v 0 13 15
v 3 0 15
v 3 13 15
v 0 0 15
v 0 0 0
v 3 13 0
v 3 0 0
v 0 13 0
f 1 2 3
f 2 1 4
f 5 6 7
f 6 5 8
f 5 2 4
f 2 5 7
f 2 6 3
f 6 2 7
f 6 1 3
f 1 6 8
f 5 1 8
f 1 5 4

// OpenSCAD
// Generated by SolidPython 1.0.1 on 2020-07-29 00:39:26


cube(size = [3, 13, 15]);
/***********************************************
*********      SolidPython code:      **********
************************************************
 
# import packages: SolidPython
from solid import *
from solid.utils import *
from itertools import chain, combinations


class Resize:

    def __init__(self, scad_file):
        self.scad_file = scad_file
        #self.scad_file = import_scad(scad_file)
        # cone/cylinder param:
        self.r1 = 0
        self.r2 = 0
        self.h = 0
        # rectangular prism param:
        self.w = 0
        self.l = 0
        # ellipse param:
        self.r = 0

    # import OpenScad code (file name corresponds to shape)


    # classify shape + parameters
    def assign(self, param1, param2, param3):
        if self.scad_file == 'cone.scad':
            self.r1 = param1
            self.r2 = param2
            self.h = param3
        elif self.scad_file == 'cylinder.scad':
            self.r1 = param1
            self.r2 = param2
            self.h = param3
        elif self.scad_file == 'rectangularPrism.scad':
            self.h = param1
            self.l = param2
            self.w = param3
        else:
            self.r = param1
            self.h = param2

    # resize parameters
    def iterate(self):
        x = range(3, 20, 2)
        i = 1
        if self.scad_file == 'cone.scad':
            tempList = list(combinations(x, 2))
            for temp in tempList:
                param1 = temp[0]
                param2 = temp[1]
                filepath = 'produced_scad_files/' + 'cone' + str(param1) + '_' + str(param2) + '_' + '.scad'
                scad_render_to_file(cylinder(h=param1, r1=param2, r2=0), filepath)

        elif self.scad_file == 'cylinder.scad':
            tempList = list(combinations(x, 3))
            for temp in tempList:
                param1 = temp[0]
                param2 = temp[1]
                filepath = 'produced_scad_files/' + 'cylinder' + str(param1) + '_' + str(param2) + '_' + '.scad'
                scad_render_to_file(cylinder(h=param1, r1=param2, r2=param2), filepath)

        elif self.scad_file == 'rectangularPrism.scad':
            tempList = list(combinations(x, 3))
            for temp in tempList:
                param1 = temp[0]
                param2 = temp[1]
                param3 = temp[2]
                filepath = 'produced_scad_files/' + 'rectangularPrism' + str(param1) + '_' + str(param2) + '_' + str(
                    param3) + '.scad'
                scad_render_to_file(cube(size=(param1, param2, param3)), filepath)

        elif self.scad_file == 'ellipse.scad':
            tempList = list(combinations(x, 4))
            for temp in tempList:
                param1 = temp[0]
                param2 = temp[1]
                param3 = temp[2]
                param4 = temp[3]
                filepath = 'produced_scad_files/' + 'ellipse' + str(param1) + '_' + str(param2) + '_' + str(param3) + '_' + str(param4) + '.scad'
                scad_render_to_file(scale([param1, param2, param3])(sphere(r=param4)), filepath)

    def render_to_scadfile(self):
        scad_render_to_file(scad, 'example.scad') 
 
************************************************/
